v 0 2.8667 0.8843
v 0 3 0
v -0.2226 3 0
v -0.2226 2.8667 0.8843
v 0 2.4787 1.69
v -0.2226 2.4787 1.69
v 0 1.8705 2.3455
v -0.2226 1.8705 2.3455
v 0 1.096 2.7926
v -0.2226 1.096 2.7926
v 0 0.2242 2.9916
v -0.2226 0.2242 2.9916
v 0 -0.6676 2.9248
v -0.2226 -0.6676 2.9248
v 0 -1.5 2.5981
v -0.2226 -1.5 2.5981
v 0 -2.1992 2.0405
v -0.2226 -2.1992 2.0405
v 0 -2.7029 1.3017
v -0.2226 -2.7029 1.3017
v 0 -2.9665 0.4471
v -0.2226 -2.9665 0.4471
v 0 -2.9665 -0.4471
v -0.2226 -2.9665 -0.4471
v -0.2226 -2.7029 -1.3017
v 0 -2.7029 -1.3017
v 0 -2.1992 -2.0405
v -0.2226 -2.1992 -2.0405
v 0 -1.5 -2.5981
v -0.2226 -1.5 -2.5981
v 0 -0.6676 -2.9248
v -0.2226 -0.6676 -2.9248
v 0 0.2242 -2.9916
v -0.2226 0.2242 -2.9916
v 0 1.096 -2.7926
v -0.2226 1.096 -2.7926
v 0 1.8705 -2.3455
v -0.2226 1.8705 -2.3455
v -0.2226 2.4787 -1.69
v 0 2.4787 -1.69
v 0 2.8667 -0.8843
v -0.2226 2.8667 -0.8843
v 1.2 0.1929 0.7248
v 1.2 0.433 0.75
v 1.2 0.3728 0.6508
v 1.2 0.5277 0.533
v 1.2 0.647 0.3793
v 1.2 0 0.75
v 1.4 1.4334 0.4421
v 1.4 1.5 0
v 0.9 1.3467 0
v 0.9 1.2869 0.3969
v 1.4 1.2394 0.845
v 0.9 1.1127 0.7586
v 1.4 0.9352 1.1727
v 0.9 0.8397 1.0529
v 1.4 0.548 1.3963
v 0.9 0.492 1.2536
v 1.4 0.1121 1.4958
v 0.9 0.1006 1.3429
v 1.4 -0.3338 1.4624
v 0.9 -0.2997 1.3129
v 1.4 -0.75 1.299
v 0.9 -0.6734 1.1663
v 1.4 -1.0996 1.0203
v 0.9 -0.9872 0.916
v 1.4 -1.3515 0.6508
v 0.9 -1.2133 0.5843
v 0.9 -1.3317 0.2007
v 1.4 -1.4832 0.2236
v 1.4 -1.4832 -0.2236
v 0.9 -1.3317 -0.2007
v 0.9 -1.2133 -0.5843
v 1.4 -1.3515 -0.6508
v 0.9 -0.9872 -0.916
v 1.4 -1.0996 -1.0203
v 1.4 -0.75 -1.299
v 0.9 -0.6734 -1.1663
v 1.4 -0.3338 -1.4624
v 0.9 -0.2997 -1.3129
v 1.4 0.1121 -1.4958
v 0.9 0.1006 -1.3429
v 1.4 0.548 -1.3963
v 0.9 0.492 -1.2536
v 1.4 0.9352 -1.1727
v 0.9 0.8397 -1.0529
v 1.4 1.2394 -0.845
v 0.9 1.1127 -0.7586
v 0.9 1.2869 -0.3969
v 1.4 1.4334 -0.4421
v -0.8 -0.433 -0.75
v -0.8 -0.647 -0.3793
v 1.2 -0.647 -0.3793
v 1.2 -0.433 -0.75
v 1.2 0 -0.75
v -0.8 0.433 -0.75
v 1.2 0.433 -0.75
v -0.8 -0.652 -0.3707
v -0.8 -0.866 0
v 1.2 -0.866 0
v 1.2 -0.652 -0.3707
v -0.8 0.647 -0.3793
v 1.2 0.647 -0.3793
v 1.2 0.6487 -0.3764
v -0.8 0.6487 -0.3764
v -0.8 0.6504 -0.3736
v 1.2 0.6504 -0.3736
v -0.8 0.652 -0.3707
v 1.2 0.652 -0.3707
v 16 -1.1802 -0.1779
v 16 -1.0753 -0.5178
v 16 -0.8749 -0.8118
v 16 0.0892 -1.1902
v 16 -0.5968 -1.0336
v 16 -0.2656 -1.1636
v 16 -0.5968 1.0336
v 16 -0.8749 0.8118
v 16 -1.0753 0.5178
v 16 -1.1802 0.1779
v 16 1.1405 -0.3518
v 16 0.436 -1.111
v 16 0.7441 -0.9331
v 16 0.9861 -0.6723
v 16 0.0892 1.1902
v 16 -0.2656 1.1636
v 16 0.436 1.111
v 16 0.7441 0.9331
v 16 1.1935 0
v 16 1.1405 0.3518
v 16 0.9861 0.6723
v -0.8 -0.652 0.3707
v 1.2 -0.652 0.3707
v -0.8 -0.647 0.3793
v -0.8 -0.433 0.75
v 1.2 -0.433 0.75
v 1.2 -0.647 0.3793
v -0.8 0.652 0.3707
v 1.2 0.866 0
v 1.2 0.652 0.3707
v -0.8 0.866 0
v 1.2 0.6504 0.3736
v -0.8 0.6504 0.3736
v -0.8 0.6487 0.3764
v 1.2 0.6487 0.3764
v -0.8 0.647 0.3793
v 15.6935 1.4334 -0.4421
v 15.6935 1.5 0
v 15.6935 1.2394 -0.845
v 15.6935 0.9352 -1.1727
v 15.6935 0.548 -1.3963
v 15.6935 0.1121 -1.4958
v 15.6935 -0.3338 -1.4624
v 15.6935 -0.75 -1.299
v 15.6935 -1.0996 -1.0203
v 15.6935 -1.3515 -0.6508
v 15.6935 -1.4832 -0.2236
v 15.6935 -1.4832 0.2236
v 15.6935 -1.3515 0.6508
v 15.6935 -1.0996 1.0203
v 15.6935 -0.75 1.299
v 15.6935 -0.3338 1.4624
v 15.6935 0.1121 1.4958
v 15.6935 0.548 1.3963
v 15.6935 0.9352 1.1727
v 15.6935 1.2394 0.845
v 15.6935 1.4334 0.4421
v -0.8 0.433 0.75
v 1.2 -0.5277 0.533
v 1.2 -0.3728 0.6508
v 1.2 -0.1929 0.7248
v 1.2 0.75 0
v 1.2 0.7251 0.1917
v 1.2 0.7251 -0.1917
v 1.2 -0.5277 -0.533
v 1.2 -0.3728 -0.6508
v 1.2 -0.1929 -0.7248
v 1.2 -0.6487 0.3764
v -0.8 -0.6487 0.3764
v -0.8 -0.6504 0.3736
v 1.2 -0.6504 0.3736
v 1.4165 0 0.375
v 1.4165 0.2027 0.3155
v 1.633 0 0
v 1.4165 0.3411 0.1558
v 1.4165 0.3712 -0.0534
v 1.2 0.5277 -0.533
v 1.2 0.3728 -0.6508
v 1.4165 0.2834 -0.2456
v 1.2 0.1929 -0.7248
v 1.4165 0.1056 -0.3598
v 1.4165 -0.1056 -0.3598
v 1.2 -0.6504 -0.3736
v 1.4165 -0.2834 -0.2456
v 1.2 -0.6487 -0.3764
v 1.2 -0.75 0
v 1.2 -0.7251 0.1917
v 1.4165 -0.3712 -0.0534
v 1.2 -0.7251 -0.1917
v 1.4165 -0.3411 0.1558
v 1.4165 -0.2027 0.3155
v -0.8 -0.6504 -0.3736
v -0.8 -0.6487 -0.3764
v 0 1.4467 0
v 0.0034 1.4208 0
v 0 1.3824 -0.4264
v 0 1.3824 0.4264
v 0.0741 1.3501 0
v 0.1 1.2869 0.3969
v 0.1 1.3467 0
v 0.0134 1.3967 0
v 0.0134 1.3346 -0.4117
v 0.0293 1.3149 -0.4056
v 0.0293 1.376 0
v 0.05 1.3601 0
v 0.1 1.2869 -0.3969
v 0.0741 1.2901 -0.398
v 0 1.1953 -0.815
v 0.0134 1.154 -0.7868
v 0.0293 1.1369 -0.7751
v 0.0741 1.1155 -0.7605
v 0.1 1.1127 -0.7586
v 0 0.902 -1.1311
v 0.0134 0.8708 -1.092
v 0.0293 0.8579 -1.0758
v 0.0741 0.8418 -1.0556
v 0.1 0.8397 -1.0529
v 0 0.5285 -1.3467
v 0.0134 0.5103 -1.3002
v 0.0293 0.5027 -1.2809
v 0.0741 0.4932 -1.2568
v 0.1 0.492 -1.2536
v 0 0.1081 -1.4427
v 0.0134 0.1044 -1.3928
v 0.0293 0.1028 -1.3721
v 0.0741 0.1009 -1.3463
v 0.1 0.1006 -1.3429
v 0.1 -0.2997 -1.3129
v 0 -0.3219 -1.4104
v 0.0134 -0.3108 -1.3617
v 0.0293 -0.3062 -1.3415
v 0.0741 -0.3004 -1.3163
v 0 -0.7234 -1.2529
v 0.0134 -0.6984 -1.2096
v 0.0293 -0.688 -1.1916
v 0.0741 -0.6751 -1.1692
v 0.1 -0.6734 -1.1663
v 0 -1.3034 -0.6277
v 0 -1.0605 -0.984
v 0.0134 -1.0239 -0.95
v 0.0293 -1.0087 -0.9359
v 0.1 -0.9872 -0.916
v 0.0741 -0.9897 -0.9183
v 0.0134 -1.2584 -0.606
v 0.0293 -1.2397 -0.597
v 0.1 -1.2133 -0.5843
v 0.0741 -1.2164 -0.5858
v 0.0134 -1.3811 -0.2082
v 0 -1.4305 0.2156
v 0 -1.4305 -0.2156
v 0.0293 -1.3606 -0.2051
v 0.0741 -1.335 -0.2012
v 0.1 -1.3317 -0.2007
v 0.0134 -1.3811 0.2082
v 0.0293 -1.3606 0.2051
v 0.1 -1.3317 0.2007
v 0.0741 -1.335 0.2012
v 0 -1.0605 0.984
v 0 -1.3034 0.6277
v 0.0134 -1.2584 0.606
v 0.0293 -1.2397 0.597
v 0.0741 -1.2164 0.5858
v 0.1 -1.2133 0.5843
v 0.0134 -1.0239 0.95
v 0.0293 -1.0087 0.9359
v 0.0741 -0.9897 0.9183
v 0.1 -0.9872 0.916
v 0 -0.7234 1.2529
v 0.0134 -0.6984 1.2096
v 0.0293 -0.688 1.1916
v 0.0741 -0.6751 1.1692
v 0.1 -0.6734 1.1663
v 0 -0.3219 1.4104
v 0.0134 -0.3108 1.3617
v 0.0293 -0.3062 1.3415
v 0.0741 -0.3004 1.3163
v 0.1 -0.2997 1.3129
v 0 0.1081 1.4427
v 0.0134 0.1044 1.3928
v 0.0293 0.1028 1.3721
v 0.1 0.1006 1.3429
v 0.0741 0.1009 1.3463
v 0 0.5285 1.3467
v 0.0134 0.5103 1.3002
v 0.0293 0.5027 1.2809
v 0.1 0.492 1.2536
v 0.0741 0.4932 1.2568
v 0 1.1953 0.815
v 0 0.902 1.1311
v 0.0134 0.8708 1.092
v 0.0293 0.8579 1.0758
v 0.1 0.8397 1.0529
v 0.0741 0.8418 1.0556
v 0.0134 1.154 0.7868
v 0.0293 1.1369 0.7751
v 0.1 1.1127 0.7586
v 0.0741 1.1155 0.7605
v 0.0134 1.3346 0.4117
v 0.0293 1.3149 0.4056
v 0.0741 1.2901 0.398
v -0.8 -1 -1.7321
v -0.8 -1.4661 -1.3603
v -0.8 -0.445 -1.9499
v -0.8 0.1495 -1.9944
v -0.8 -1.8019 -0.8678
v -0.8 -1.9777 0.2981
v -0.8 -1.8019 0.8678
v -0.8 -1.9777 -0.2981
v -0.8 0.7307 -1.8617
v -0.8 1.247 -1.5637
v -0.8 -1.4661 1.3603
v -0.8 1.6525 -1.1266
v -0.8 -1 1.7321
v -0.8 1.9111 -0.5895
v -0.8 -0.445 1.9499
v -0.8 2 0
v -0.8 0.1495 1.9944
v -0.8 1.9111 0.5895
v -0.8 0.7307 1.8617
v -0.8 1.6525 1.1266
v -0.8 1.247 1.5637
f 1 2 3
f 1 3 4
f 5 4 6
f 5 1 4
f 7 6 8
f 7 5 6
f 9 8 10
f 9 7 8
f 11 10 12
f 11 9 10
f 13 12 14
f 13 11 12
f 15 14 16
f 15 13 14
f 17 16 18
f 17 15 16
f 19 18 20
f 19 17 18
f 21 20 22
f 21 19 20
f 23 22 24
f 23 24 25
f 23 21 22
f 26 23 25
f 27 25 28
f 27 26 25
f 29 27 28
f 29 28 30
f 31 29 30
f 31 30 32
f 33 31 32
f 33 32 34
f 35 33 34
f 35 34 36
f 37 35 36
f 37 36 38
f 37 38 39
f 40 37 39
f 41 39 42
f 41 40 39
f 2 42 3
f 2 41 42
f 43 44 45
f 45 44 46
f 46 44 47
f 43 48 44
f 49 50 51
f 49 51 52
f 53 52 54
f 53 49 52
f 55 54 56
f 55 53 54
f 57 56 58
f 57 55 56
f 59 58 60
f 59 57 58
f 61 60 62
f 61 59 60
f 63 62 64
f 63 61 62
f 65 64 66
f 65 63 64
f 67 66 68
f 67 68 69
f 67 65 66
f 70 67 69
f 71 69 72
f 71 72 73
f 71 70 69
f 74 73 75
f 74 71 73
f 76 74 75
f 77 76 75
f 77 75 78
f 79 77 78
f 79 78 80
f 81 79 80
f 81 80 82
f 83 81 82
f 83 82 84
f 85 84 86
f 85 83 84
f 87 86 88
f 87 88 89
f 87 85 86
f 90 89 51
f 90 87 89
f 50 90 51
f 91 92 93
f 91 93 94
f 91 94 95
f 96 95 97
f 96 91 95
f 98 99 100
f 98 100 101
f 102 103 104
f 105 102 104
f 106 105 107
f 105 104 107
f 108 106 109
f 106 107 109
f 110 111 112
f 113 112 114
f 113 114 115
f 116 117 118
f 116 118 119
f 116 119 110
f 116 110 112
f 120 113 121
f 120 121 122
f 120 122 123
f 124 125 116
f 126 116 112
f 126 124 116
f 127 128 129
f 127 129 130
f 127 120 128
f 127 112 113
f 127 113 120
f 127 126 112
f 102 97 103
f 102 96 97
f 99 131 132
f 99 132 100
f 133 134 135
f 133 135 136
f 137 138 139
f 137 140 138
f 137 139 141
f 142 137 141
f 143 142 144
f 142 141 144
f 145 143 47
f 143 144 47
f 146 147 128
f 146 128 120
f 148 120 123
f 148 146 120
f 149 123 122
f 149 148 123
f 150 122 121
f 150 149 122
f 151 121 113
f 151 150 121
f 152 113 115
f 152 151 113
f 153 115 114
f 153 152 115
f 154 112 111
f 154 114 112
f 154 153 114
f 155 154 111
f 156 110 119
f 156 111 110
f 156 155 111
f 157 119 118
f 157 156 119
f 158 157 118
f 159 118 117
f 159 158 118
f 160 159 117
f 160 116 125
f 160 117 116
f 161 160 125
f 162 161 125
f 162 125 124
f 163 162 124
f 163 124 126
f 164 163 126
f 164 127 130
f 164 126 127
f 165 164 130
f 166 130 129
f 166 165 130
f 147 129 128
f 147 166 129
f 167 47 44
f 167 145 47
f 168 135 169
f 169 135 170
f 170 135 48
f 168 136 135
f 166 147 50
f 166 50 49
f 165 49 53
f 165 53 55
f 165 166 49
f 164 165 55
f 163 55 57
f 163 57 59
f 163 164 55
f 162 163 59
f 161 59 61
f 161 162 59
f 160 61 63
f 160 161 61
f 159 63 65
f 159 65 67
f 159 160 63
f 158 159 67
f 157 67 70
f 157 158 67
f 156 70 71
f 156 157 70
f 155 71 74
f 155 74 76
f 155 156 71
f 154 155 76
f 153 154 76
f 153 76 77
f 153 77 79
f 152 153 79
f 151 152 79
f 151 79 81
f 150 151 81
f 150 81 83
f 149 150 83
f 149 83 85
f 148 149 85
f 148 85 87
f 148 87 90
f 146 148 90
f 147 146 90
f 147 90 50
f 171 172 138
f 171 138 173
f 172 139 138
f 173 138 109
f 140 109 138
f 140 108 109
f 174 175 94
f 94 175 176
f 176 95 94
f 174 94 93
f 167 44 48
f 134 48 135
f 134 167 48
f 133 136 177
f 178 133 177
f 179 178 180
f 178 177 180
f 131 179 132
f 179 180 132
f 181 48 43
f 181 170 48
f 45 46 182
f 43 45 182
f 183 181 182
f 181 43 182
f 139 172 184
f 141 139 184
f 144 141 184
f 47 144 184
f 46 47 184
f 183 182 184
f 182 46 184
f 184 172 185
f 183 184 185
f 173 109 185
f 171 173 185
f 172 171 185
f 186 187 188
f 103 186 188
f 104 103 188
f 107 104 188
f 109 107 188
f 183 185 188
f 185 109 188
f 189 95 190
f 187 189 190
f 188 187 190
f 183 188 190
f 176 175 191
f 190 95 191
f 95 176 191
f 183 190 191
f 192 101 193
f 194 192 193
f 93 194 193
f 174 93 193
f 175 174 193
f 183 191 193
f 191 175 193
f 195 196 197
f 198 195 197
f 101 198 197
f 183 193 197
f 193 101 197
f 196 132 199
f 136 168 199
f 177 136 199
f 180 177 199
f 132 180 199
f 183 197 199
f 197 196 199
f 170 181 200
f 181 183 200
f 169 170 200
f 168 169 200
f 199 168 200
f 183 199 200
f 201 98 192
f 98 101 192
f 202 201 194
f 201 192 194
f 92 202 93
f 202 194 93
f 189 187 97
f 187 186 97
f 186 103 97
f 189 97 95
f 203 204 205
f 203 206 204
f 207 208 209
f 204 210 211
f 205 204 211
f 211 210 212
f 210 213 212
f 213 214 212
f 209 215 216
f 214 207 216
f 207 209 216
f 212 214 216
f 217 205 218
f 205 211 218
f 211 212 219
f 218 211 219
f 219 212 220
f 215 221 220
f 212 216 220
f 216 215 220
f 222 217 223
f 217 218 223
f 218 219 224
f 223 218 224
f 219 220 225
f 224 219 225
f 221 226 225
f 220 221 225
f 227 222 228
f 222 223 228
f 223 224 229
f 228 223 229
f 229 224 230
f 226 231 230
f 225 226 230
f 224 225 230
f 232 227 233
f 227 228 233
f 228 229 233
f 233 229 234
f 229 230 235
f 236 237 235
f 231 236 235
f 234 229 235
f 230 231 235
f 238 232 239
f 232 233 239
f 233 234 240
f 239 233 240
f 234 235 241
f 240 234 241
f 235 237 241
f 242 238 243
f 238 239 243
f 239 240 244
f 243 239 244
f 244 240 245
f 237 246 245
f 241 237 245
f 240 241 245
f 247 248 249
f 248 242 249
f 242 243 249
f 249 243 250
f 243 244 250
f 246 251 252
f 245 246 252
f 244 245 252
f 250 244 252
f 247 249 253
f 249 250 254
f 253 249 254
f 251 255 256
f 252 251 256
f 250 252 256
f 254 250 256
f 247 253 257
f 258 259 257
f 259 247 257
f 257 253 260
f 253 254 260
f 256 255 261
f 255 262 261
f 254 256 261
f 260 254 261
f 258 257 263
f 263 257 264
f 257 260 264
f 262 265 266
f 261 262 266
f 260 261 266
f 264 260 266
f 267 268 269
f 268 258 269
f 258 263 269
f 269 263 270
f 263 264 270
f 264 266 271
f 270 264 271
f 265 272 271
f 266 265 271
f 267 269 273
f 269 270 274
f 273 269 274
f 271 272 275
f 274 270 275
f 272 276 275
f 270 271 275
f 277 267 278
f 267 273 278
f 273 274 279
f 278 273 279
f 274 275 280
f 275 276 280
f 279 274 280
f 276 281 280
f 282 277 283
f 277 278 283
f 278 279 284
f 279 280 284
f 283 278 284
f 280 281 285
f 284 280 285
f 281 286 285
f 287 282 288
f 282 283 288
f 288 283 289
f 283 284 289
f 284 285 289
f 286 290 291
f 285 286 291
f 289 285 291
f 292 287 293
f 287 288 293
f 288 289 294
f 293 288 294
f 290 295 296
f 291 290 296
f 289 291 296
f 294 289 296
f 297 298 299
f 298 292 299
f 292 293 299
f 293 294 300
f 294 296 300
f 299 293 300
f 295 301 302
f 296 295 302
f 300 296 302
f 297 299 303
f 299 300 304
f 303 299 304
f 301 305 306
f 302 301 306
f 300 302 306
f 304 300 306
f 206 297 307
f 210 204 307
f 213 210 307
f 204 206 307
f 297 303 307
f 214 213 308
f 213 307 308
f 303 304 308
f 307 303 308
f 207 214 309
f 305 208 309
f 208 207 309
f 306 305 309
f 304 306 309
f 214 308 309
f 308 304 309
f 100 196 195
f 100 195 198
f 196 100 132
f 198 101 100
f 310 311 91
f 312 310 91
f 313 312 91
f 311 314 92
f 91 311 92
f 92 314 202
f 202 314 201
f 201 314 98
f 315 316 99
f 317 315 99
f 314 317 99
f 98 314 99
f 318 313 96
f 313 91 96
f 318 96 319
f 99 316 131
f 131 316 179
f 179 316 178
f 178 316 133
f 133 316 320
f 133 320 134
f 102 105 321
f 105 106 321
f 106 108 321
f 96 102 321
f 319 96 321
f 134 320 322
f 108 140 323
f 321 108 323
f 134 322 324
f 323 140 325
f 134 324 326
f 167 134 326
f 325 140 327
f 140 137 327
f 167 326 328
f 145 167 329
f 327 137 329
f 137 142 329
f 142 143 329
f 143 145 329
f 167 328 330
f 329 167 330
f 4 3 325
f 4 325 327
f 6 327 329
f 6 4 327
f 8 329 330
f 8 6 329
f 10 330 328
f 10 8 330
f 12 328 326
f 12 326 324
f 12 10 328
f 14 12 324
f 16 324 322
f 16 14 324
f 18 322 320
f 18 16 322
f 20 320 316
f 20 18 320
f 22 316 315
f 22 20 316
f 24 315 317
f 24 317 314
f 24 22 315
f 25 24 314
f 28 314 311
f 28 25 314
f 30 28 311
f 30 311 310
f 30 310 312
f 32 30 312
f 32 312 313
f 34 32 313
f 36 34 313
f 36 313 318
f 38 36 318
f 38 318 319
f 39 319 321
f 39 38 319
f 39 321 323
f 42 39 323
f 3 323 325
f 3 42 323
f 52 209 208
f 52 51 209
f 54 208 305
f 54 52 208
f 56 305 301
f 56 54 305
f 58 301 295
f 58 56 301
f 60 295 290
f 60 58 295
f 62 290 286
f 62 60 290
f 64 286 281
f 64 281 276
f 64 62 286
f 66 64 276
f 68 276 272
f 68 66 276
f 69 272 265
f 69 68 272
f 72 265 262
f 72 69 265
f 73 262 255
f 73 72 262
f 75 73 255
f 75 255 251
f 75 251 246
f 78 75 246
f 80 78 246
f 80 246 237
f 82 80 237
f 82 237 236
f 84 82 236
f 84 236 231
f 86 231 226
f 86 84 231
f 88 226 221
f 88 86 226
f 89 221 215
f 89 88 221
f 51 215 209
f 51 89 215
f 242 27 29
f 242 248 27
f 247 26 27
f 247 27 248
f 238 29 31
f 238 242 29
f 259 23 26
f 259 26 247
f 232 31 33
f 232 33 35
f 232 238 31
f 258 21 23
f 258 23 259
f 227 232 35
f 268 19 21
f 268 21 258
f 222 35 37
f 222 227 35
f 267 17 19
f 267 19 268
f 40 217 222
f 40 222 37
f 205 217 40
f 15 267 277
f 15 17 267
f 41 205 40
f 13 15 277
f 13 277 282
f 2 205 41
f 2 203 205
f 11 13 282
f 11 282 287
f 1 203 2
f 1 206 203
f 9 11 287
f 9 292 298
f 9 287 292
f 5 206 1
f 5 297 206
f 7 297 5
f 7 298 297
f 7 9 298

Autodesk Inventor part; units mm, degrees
ref_plane "YZ Plane" through (0, 0, 0) normal (1, 0, 0) x (0, 1, 0)
ref_plane "XZ Plane" through (0, 0, 0) normal (0, 1, 0) x (-1, 0, 0)
ref_plane "XY Plane" through (0, 0, 0) normal (0, 0, 1) x (1, 0, 0)
sketch "Sketch_1" plane through (0, 0, 0) normal (0, 0, 1) x (1, 0, 0)
  line L0 (16, 0) -> (-0.8, 0)
  line L1 (-0.8, 0) -> (-0.8, 2)
  line L2 (-0.8, 2) -> (-0.2226, 3)
  line L3 (-0.2226, 3) -> (0, 3)
  line L4 (0, 3) -> (0, 1.4467)
  arc A0 (0, 1.4467) -> (0.1, 1.3467) centre (0.1, 1.4467) ccw
  line L5 (0.1, 1.3467) -> (0.9, 1.3467)
  line L6 (0.9, 1.3467) -> (1.4, 1.5)
  line L7 (1.4, 1.5) -> (15.6935, 1.5)
  line L8 (15.6935, 1.5) -> (16, 1.1935)
  line L9 (16, 1.1935) -> (16, 0)
  line L10 (16, 0) -> (-0.8, 0)
revolve "Revolution1" add sketch "Sketch_1" angle 360 about axis through (16, 0, 0) along (1, 0, 0)
thread "Thread1" size "M3x0.5" class "6g" standard "ISO Metric profile" full length
sketch "Sketch2" plane through (-0.8, 0, 0) normal (-1, 0, 0) x (0, 0, 1)
  point P0 (0, 0)
hole "Hole1" at (-0.8, 0, 0) direction (1, 0, 0) diameter 1.5 depth 2 tip angle 120
sketch "Sketch_3" plane through (-0.8, 0, 0) normal (1, 0, 0) x (0, 0, -1)
  line L0 (-0.75, -0.433) -> (0, -0.866)
  line L1 (0, -0.866) -> (0.75, -0.433)
  line L2 (0.75, -0.433) -> (0.75, 0.433)
  line L3 (0.75, 0.433) -> (0, 0.866)
  line L4 (0, 0.866) -> (-0.75, 0.433)
  line L5 (-0.75, 0.433) -> (-0.75, -0.433)
extrude "Extrusion1" cut sketch "Sketch_3" along normal blind 2
properties part number "CBSTNR3-16" material "鋼、炭素鋼"
